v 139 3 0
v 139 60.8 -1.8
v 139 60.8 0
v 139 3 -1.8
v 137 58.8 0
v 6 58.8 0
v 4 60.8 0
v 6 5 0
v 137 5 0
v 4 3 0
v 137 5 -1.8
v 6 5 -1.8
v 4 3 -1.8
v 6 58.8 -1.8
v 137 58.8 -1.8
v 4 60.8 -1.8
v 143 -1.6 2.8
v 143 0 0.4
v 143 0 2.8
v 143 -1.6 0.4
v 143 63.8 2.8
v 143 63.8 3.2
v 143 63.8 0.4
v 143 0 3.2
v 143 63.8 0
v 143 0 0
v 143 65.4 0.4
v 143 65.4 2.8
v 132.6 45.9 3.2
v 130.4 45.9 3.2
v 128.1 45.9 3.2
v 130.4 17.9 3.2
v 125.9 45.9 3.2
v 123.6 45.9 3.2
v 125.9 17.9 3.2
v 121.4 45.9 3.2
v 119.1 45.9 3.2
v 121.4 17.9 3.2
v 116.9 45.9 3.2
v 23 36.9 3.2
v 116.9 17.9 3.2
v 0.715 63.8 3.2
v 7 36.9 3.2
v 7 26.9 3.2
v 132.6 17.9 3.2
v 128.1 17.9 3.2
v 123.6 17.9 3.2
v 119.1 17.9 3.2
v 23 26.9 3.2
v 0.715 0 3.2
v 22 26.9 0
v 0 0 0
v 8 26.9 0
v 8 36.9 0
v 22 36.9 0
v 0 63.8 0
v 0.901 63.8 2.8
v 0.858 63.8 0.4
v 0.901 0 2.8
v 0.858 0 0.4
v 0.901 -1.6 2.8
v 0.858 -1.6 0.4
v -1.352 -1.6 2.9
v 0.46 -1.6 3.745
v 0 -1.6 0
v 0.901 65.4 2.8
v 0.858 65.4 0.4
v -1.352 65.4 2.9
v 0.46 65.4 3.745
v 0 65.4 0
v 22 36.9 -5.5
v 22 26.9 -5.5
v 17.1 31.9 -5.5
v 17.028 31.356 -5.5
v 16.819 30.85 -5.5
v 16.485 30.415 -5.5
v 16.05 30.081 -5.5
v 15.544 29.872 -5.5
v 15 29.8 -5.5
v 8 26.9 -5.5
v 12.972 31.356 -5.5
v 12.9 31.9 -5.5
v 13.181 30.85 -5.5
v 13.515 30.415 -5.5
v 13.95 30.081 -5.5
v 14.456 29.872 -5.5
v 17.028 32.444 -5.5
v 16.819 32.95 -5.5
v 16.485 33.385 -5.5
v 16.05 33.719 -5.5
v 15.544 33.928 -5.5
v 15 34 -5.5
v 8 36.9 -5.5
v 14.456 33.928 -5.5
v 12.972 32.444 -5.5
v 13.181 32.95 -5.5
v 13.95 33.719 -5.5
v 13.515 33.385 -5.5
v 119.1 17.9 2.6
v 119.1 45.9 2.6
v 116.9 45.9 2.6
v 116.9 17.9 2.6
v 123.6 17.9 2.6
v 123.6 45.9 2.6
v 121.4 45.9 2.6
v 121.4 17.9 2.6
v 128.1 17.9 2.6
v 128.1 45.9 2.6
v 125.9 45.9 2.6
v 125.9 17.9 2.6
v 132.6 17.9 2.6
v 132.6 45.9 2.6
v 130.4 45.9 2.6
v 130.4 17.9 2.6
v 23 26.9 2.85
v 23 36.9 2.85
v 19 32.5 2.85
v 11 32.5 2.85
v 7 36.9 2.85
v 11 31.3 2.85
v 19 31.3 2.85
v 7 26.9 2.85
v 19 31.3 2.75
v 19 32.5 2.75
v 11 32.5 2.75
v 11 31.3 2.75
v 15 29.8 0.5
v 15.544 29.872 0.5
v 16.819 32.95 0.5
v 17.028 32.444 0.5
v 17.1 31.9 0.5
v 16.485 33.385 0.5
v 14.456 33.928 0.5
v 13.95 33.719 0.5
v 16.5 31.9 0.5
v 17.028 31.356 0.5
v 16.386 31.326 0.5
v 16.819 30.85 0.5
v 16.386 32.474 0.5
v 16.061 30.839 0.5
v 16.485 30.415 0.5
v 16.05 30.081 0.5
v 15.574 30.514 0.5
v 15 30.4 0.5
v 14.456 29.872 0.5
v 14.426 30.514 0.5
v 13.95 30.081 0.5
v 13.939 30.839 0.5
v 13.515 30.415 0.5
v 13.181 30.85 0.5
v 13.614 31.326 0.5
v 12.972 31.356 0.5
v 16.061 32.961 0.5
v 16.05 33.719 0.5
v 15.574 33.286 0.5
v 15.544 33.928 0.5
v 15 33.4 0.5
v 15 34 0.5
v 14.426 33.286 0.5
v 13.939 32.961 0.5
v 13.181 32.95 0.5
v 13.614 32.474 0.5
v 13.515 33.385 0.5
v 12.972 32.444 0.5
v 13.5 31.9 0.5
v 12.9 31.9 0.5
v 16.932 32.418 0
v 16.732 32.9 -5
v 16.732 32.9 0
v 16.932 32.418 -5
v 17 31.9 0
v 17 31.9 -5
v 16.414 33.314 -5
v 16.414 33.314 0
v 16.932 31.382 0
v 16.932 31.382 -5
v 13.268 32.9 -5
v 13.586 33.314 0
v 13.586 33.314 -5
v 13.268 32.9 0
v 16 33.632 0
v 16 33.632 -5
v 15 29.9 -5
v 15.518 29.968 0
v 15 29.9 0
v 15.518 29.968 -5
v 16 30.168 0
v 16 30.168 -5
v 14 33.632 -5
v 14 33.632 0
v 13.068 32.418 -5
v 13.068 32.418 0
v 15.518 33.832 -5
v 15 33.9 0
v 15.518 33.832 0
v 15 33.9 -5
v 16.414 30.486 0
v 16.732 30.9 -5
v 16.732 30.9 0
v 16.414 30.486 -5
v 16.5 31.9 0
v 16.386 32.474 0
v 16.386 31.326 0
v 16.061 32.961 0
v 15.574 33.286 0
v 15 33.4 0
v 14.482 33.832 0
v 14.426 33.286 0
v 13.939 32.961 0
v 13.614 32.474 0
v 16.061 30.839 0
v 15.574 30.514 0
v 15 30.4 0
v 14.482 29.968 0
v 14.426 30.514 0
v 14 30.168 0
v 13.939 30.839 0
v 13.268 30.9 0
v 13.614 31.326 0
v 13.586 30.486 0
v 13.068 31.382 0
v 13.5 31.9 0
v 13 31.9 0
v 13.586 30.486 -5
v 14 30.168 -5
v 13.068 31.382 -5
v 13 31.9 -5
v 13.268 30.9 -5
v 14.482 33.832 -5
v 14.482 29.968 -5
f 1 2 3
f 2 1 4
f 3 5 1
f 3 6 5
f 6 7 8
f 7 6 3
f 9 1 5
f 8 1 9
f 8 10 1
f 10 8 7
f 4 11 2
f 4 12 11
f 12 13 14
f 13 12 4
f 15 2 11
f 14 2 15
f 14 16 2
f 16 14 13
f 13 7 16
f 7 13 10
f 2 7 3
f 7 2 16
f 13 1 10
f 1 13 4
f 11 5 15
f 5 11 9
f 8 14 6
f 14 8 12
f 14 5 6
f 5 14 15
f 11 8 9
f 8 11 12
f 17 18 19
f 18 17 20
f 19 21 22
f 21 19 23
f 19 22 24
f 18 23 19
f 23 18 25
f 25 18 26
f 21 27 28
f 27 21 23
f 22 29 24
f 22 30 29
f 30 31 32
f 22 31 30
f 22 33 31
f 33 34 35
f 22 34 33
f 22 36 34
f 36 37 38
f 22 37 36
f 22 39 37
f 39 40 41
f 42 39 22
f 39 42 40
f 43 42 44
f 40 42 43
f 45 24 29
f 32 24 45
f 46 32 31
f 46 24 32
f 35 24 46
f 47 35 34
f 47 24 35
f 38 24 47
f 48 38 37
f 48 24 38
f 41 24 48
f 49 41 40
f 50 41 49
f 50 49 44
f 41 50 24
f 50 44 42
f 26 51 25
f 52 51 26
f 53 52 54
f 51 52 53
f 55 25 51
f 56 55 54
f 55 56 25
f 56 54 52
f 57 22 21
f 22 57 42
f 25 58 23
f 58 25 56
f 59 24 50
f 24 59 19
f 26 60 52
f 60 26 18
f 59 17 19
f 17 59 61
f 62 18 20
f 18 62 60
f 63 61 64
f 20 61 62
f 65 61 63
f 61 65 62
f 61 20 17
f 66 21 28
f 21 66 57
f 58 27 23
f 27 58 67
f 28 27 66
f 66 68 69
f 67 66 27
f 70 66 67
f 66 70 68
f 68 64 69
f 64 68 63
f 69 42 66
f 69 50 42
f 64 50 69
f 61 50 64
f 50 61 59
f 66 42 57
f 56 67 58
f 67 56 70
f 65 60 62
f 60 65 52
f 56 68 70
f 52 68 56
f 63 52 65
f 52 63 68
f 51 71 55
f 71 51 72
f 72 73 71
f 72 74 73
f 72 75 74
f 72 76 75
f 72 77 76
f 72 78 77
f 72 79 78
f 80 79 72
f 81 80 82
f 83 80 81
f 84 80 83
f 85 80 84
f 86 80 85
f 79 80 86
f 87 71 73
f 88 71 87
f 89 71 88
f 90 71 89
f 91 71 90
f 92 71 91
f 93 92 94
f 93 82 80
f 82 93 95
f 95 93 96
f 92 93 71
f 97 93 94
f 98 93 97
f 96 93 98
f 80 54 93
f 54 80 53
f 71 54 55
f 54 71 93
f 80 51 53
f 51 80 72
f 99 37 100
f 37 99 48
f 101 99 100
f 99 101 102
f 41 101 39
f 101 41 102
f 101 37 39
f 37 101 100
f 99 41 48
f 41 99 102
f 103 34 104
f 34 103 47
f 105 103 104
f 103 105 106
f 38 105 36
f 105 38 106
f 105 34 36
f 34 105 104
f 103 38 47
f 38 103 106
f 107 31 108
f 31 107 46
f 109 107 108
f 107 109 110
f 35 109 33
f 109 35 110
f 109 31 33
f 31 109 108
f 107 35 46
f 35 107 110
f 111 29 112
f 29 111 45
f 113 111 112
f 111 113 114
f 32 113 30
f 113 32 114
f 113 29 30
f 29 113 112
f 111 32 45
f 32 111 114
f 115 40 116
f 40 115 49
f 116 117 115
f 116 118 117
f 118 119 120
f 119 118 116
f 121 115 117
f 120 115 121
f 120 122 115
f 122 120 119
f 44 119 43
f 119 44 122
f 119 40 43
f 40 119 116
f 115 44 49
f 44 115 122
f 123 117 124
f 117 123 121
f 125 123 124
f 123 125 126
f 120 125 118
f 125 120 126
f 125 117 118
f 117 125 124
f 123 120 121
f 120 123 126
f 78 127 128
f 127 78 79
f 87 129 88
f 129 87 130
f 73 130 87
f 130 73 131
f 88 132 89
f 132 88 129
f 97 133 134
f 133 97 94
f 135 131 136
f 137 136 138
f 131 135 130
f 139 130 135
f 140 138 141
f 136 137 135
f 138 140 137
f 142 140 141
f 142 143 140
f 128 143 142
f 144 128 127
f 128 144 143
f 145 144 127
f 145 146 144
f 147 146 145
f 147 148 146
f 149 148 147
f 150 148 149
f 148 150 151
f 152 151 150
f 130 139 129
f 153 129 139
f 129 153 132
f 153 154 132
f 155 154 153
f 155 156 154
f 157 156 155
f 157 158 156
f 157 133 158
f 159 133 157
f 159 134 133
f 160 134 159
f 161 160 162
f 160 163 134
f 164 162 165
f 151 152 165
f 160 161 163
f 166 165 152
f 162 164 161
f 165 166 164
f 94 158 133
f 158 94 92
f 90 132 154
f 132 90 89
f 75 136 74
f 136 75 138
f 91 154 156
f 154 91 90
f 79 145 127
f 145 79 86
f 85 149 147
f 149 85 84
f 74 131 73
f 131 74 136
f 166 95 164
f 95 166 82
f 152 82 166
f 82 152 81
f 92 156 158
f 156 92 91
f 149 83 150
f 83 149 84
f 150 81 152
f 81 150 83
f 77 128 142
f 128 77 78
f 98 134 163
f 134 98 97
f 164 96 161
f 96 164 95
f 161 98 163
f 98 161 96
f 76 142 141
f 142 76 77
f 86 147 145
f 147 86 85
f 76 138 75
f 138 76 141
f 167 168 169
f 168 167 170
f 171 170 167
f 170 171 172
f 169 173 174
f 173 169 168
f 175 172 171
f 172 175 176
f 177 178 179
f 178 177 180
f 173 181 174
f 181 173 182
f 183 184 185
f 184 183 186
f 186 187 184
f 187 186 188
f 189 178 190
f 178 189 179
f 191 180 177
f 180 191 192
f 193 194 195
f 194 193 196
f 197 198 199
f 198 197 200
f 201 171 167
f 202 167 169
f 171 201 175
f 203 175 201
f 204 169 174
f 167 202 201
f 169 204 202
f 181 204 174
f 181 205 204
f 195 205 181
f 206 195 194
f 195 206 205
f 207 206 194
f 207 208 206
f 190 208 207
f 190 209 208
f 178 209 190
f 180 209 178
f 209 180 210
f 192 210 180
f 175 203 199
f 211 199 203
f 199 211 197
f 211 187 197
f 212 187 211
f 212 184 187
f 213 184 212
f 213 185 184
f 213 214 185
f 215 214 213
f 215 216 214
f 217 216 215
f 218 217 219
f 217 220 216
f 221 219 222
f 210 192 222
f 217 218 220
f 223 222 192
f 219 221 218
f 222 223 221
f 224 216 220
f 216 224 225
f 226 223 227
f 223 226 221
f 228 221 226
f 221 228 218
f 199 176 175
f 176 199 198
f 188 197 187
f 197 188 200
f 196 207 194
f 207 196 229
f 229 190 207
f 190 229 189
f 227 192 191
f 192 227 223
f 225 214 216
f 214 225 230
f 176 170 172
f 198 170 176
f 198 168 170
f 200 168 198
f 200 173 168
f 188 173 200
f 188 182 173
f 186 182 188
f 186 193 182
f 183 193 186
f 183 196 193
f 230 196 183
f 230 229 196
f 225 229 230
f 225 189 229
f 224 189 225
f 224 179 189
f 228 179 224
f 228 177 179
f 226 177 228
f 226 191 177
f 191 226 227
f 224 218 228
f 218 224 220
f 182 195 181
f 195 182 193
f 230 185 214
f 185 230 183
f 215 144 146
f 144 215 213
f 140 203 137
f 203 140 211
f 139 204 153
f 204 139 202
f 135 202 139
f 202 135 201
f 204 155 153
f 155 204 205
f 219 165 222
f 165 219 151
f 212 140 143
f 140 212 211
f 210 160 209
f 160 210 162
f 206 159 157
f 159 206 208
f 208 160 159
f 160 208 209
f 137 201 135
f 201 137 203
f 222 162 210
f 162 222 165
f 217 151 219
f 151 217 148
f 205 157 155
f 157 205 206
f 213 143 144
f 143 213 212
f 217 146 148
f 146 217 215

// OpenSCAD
// file: ../../00_common/parameters.scad
// =============================================================================
// OpenMotorBridge - Global CAD Parameters & Settings
// =============================================================================
// File: hardware/cad/scad/00_common/parameters.scad
// Description: Global dimensional constants, manufacturing clearances and
//              circle resolution ($fn) for all OpenSCAD modules.
// =============================================================================

// --- 1. Circle & Curve Resolution ---
$fn = 60; // Smooth cylinders and holes for high-quality MJF 3D printing

// --- 2. Central Main Box Dimensions (3-Tier Sandwich) ---
MAIN_BOX_OUTER_L      = 110.0; // Outer length in X (mm)
MAIN_BOX_OUTER_W      = 74.0;  // Outer width in Y (mm)
MAIN_BOX_LOWER_H      = 17.0;  // Lower case height in Z (mm)
MAIN_BOX_MID_H        = 15.0;  // Mid tray height in Z (mm)
MAIN_BOX_LID_H        = 4.0;   // Lid plate thickness in Z (mm)
MAIN_BOX_WALL         = 2.5;   // Nominal wall thickness (mm)
MAIN_BOX_CORNER_POST  = 7.0;   // Corner clamping screw post size (mm, for M3 hex nut pockets)

// --- 3. Satellite Pod Dimensions (Universal Enlarged Envelope) ---
POD_OUTER_L           = 150.0; // Outer length in X (mm, standardized for serial PCBA 03 + Cardo/Sena/OMM)
POD_OUTER_W           = 70.0;  // Outer width in Y (mm)
POD_OUTER_H           = 38.0;  // Outer height in Z (mm)
POD_WALL              = 3.5;   // Nominal wall thickness (mm)
POD_BULKHEAD_X        = 18.0;  // Partition bulkhead position in X (mm)
POD_CHAMBER_L         = 132.0; // Sliding chamber length in X (mm, clears 130mm sled + 2mm margin)
POD_CHAMBER_W         = 63.0;  // Sliding chamber width in Y (mm)
POD_CHAMBER_H         = 31.0;  // Sliding chamber height in Z (mm)

// --- 4. Pod Linear Guide Rails (Poka-Yoke Tongue & Groove) ---
POD_GROOVE_W          = 3.0;   // Internal guide groove width in Z (mm)
POD_GROOVE_DEPTH      = 1.5;   // Internal guide groove depth in Y (mm)
POD_GROOVE_LEFT_Z     = 10.0;  // Center height of left groove (mm)
POD_GROOVE_RIGHT_Z    = 18.0;  // Center height of right groove (mm, asym offset)

CARTRIDGE_TONGUE_W    = 2.6;   // Cartridge tongue rail height in Z (mm, 0.2mm clearance)
CARTRIDGE_TONGUE_PROT = 1.4;   // Cartridge tongue protrusion in Y (mm, 0.1mm clearance)
CARTRIDGE_CHAMFER_L   = 4.0;   // 30° lead-in chamfer nose length (mm)

// --- 5. Cartridge Dimensions (Enlarged Universal Sled) ---
CARTRIDGE_BASE_L      = 130.0; // Sled length in X (mm, accommodates PCBA 03 + OEM Cardo Air-Mount/Sena/OMM serial layout)
CARTRIDGE_BASE_W      = 58.0;  // Sled width in Y (mm)
CARTRIDGE_BASE_H      = 28.0;  // Sled height in Z (mm)
CARTRIDGE_FACE_L      = 4.0;   // Front faceplate thickness in X (mm)
CARTRIDGE_FACE_W      = 64.0;  // Front faceplate width in Y (mm)
CARTRIDGE_FACE_H      = 34.0;  // Front faceplate height in Z (mm)

// --- 5a. RF Interface & Sealing Dimensions ---
SMA_BORE_R            = 3.25;  // Ø 6.5 mm through-hole for standard SMA bulkhead
SMA_ORECESS_R         = 4.75;  // Ø 9.5 mm recess for waterproof silicone O-ring
SMA_ORECESS_DEPTH     = 1.2;   // 1.2 mm deep O-ring compression pocket

// --- 5b. Magnetic Anti-Theft Lock System ---
LATCH_PIVOT_X         = 65.0;  // Center pivot position along sled X (mm, centered on 130mm sled)
LATCH_MAGNET_X        = 53.0;  // Ferromagnetic anchor position along sled X (mm)
LATCH_TOOTH_X         = 77.0;  // Locking sawtooth pawl position along sled X (mm)
LATCH_ARM_H           = 6.0;   // Rocker lever height in Z (mm)
LATCH_ARM_THICK       = 2.6;   // Rocker beam thickness in Y (mm)
LATCH_MAGNET_PIN_DIA  = 6.2;   // Bore for Ø 6.0 mm steel dowel pin (mm)
LATCH_SPRING_DIA      = 3.8;   // Bore for Ø 3.5 mm return compression spring (mm)

// --- 6. Standard Captive Hex Nut Pockets (DIN 934 / DIN 985 with +0.2 mm MJF/FDM clearance) ---
NUT_M2_SW             = 4.2;   // M2 across flats (nominal 4.0 mm)
NUT_M2_H              = 1.8;   // M2 thickness (nominal 1.6 mm)
NUT_M2_5_SW           = 5.2;   // M2.5 across flats (nominal 5.0 mm)
NUT_M2_5_H            = 2.2;   // M2.5 thickness (nominal 2.0 mm)
NUT_M3_SW             = 5.7;   // M3 across flats (nominal 5.5 mm)
NUT_M3_H              = 2.6;   // M3 thickness (nominal 2.4 mm)
NUT_M4_SW             = 7.2;   // M4 across flats (nominal 7.0 mm)
NUT_M4_H              = 3.4;   // M4 thickness (nominal 3.2 mm)
NUT_M5_SW             = 8.2;   // M5 across flats (nominal 8.0 mm)
NUT_M5_H              = 4.2;   // M5 thickness (nominal 4.0 mm)

// Direct Plastic Thread-Forming / Self-Tapping Pilot Holes in PA12 (100% Soldering-Iron Free)
M2_PILOT_HOLE_R       = 0.85;  // Core hole for M2 screws in PA12 (Ø 1.7 mm)
M2_5_PILOT_HOLE_R     = 1.05;  // Core hole for M2.5 screws in PA12 (Ø 2.1 mm)
M3_PILOT_HOLE_R       = 1.25;  // Core hole for M3 screws in PA12 (Ø 2.5 mm)

// --- 7. Screw & Clearance Dimensions ---
M2_SCREW_HOLE_R       = 1.1;   // M2 clearance hole (r = 1.1 mm -> Ø 2.2 mm)
M2_5_SCREW_HOLE_R     = 1.4;   // M2.5 clearance hole (r = 1.4 mm -> Ø 2.8 mm)
M3_SCREW_HOLE_R       = 1.65;  // M3 clearance hole (r = 1.65 mm -> Ø 3.3 mm)
M4_SCREW_HOLE_R       = 2.2;   // M4 clearance hole (r = 2.2 mm -> Ø 4.4 mm)
M8_BORE_R             = 4.0;   // M8 cable through-bore (r = 4.0 mm -> Ø 8.0 mm)
M8_STUDS_OUTER_R      = 6.0;   // M8 neck outer radius (Ø 12.0 mm)

// --- 8. Universal Front Node Enclosure Dimensions (Type E: 98 x 68 x 25 mm) ---
FRONT_NODE_PCB_L      = 82.0;  // PCB length in X (mm, PCBA 05)
FRONT_NODE_PCB_W      = 50.0;  // PCB width in Y (mm, PCBA 05)
FRONT_NODE_PCB_H      = 1.6;   // PCB thickness in Z (mm)
FRONT_NODE_PCB_R      = 2.5;   // PCB corner radius (mm)

FRONT_NODE_CHAMBER_L  = 86.0;  // Internal chamber length in X (mm, 2mm margin per side)
FRONT_NODE_CHAMBER_W  = 56.0;  // Internal chamber width in Y (mm, 3mm margin per side)
FRONT_NODE_TUB_H      = 17.5;  // Lower tub depth in Z (mm)
FRONT_NODE_LID_H      = 7.5;   // Upper lid height in Z (mm)
FRONT_NODE_WALL       = 2.5;   // Wall thickness in HP MJF PA12 (mm)
FRONT_NODE_CORNER_R   = 4.0;   // Outer enclosure corner radius (mm)

FRONT_NODE_OUTER_L    = FRONT_NODE_CHAMBER_L + 2 * FRONT_NODE_WALL + 7.0; // 98.0 mm
FRONT_NODE_OUTER_W    = FRONT_NODE_CHAMBER_W + 2 * FRONT_NODE_WALL + 7.0; // 68.0 mm
FRONT_NODE_OUTER_H    = FRONT_NODE_TUB_H + FRONT_NODE_LID_H;              // 25.0 mm

// PCB Standoff Heights & Radii (100% Soldering-Iron Free)
FRONT_NODE_STANDOFF_H = 3.0;   // Height of PCB standoffs from floor (mm)
FRONT_NODE_STANDOFF_R = 3.0;   // Outer radius of M2.5 screw bosses (mm)
FRONT_NODE_CORE_HOLE_R= M2_5_PILOT_HOLE_R; // Core hole for direct M2.5 screw engagement (Ø 2.1 mm)

// AMPS 4-Hole Mounting Pattern (38 x 30 mm with DIN 934 M4 Captive Nut Pockets)
AMPS_SPACING_X        = 38.0;  // AMPS hole distance in X (mm)
AMPS_SPACING_Y        = 30.0;  // AMPS hole distance in Y (mm)
AMPS_NUT_SW           = NUT_M4_SW; // Captive M4 hex nut pocket across flats (7.2 mm)
AMPS_NUT_H            = NUT_M4_H;  // Captive M4 hex nut pocket depth (3.4 mm)

// Acoustic Vent for Knowles SPH0645 MEMS
FRONT_NODE_MIC_HOLE_R = 1.25;  // Sound canal radius (Ø 2.5 mm)
FRONT_NODE_MIC_MEMB_R = 3.0;   // Gore ePTFE membrane pocket radius (Ø 6.0 mm)
FRONT_NODE_MIC_MEMB_D = 0.8;   // Membrane pocket depth (mm)
// main file
// =============================================================================
// OpenMotorBridge - Satellite Pod: Slide-in Lid (Schiebedeckel)
// =============================================================================
// File: hardware/cad/scad/02_pod_base/parts/013_pod_slide_lid.scad
// Description: Monocoque Satellite Pod Slide-in Lid with continuous lateral
//              guide tongues and 100% INTERNAL tamper-proof magnetic FOB lock.
//
// Mechanical Features:
// 1. True Slide-in design: Slides in horizontally from the rear along the X-axis
//    within precision U-profile guide grooves in the housing sidewalls.
// 2. 100% Internal Anti-Theft Latch (Zero external sliders / tamper-proof):
//    An internal spring-loaded magnetic deadbolt clicks down into a blind
//    socket in the tub floor when fully inserted.
// 3. Proximity Keyfob (PCBA 07) Release:
//    Holding the smart keyfob over the marked RFID target zone magnetically
//    lifts the internal deadbolt against its spring, releasing the lid.
// 4. Smooth exterior with ergonomic rear push-grip flutes for motorcycle gloves.
// =============================================================================

include <../../00_common/parameters.scad>;

$fn = 32;

// Lid Mechanical Dimensions
LID_L       = 143.0; // Fits inside tub with front stop collar (mm)
LID_W       = 63.8;  // Fits into side grooves (mm)
LID_PLATE_H = 3.2;   // Main rigid top plate thickness (mm)
TONGUE_W    = 1.6;   // Lateral guide tongue protrusion on each flank (mm)
TONGUE_H    = 2.4;   // Tongue thickness sliding in groove (mm)

module pod_slide_lid(show_internal_lock = true) {
    difference() {
        union() {
            // 1. Main Slide-in Lid Plate (Smooth, flush automotive surface)
            cube([LID_L, LID_W, LID_PLATE_H], center=false);

            // 2. Continuous Lateral Guide Tongues (Left & Right Flanks)
            // Left flank tongue (slides in Y = POD_WALL groove)
            translate([0, -TONGUE_W, 0.4])
                cube([LID_L, TONGUE_W, TONGUE_H], center=false);
            // Right flank tongue (slides in Y = POD_OUTER_W - POD_WALL groove)
            translate([0, LID_W, 0.4])
                cube([LID_L, TONGUE_W, TONGUE_H], center=false);

            // 3. Front Nose Lead-in Chamfer (for smooth insertion into rear slot)
            translate([0, -TONGUE_W, 0])
                rotate([0, -25, 0])
                    cube([2.0, LID_W + 2*TONGUE_W, LID_PLATE_H], center=false);

            // 4. Underside Perimeter Sealing Tongue (IP67 compressible EPDM seal)
            translate([4.0, 3.0, -1.8]) {
                difference() {
                    cube([LID_L - 8.0, LID_W - 6.0, 1.8], center=false);
                    translate([2.0, 2.0, -0.2])
                        cube([LID_L - 12.0, LID_W - 10.0, 2.2], center=false);
                }
            }

            // 5. Internal Deadbolt Housing Boss (on underside, 100% INTERNAL)
            translate([8.0, LID_W/2.0 - 5.0, -5.5]) {
                cube([14.0, 10.0, 5.5], center=false);
            }
        }

        // --- SUBTRACTIONS (100% Smooth Exterior - Zero External Sliders!) ---

        // 6. Rear Glove-Grip Push Flutes (Tactile thumb grip for sliding)
        for (gx = [LID_L - 25.0 : 4.5 : LID_L - 8.0]) {
            translate([gx, LID_W/2.0, LID_PLATE_H - 0.2])
                cube([2.2, 28.0, 0.8], center=true);
        }

        // 7. Flush RFID / Keyfob Proximity Target Badge (at X = 15.0 mm)
        // Subtle 0.3 mm recessed marking on top indicating keyfob placement
        translate([15.0, LID_W/2.0, LID_PLATE_H - 0.15]) {
            cube([16.0, 10.0, 0.4], center=true);
            // Subtle embossed key icon groove
            cube([8.0, 1.2, 0.6], center=true);
        }

        // 8. Internal Deadbolt Guide Bore (Ø 4.2 mm x 5.0 mm deep on underside)
        // Spring and magnetic steel pin reside entirely within this cavity
        translate([15.0, LID_W/2.0, -6.0])
            cylinder(r=2.1, h=6.5, center=false, $fn=24);
    }

    // Visual demonstration of internal magnetic latch mechanism (if enabled)
    if (show_internal_lock) {
        // Internal Stainless Steel Magnetic Deadbolt Pin (Ø 4.0 x 5.0 mm)
        color("silver")
            translate([15.0, LID_W/2.0, -5.0])
                cylinder(r=2.0, h=5.0, center=false, $fn=24);

        // Internal Helical Return Spring (Gold)
        color("gold")
            translate([15.0, LID_W/2.0, -1.0])
                cylinder(r=1.5, h=2.0, center=false, $fn=16);
    }
}

// Standalone execution preview
color([0.22, 0.23, 0.25])
    pod_slide_lid(show_internal_lock = true);
